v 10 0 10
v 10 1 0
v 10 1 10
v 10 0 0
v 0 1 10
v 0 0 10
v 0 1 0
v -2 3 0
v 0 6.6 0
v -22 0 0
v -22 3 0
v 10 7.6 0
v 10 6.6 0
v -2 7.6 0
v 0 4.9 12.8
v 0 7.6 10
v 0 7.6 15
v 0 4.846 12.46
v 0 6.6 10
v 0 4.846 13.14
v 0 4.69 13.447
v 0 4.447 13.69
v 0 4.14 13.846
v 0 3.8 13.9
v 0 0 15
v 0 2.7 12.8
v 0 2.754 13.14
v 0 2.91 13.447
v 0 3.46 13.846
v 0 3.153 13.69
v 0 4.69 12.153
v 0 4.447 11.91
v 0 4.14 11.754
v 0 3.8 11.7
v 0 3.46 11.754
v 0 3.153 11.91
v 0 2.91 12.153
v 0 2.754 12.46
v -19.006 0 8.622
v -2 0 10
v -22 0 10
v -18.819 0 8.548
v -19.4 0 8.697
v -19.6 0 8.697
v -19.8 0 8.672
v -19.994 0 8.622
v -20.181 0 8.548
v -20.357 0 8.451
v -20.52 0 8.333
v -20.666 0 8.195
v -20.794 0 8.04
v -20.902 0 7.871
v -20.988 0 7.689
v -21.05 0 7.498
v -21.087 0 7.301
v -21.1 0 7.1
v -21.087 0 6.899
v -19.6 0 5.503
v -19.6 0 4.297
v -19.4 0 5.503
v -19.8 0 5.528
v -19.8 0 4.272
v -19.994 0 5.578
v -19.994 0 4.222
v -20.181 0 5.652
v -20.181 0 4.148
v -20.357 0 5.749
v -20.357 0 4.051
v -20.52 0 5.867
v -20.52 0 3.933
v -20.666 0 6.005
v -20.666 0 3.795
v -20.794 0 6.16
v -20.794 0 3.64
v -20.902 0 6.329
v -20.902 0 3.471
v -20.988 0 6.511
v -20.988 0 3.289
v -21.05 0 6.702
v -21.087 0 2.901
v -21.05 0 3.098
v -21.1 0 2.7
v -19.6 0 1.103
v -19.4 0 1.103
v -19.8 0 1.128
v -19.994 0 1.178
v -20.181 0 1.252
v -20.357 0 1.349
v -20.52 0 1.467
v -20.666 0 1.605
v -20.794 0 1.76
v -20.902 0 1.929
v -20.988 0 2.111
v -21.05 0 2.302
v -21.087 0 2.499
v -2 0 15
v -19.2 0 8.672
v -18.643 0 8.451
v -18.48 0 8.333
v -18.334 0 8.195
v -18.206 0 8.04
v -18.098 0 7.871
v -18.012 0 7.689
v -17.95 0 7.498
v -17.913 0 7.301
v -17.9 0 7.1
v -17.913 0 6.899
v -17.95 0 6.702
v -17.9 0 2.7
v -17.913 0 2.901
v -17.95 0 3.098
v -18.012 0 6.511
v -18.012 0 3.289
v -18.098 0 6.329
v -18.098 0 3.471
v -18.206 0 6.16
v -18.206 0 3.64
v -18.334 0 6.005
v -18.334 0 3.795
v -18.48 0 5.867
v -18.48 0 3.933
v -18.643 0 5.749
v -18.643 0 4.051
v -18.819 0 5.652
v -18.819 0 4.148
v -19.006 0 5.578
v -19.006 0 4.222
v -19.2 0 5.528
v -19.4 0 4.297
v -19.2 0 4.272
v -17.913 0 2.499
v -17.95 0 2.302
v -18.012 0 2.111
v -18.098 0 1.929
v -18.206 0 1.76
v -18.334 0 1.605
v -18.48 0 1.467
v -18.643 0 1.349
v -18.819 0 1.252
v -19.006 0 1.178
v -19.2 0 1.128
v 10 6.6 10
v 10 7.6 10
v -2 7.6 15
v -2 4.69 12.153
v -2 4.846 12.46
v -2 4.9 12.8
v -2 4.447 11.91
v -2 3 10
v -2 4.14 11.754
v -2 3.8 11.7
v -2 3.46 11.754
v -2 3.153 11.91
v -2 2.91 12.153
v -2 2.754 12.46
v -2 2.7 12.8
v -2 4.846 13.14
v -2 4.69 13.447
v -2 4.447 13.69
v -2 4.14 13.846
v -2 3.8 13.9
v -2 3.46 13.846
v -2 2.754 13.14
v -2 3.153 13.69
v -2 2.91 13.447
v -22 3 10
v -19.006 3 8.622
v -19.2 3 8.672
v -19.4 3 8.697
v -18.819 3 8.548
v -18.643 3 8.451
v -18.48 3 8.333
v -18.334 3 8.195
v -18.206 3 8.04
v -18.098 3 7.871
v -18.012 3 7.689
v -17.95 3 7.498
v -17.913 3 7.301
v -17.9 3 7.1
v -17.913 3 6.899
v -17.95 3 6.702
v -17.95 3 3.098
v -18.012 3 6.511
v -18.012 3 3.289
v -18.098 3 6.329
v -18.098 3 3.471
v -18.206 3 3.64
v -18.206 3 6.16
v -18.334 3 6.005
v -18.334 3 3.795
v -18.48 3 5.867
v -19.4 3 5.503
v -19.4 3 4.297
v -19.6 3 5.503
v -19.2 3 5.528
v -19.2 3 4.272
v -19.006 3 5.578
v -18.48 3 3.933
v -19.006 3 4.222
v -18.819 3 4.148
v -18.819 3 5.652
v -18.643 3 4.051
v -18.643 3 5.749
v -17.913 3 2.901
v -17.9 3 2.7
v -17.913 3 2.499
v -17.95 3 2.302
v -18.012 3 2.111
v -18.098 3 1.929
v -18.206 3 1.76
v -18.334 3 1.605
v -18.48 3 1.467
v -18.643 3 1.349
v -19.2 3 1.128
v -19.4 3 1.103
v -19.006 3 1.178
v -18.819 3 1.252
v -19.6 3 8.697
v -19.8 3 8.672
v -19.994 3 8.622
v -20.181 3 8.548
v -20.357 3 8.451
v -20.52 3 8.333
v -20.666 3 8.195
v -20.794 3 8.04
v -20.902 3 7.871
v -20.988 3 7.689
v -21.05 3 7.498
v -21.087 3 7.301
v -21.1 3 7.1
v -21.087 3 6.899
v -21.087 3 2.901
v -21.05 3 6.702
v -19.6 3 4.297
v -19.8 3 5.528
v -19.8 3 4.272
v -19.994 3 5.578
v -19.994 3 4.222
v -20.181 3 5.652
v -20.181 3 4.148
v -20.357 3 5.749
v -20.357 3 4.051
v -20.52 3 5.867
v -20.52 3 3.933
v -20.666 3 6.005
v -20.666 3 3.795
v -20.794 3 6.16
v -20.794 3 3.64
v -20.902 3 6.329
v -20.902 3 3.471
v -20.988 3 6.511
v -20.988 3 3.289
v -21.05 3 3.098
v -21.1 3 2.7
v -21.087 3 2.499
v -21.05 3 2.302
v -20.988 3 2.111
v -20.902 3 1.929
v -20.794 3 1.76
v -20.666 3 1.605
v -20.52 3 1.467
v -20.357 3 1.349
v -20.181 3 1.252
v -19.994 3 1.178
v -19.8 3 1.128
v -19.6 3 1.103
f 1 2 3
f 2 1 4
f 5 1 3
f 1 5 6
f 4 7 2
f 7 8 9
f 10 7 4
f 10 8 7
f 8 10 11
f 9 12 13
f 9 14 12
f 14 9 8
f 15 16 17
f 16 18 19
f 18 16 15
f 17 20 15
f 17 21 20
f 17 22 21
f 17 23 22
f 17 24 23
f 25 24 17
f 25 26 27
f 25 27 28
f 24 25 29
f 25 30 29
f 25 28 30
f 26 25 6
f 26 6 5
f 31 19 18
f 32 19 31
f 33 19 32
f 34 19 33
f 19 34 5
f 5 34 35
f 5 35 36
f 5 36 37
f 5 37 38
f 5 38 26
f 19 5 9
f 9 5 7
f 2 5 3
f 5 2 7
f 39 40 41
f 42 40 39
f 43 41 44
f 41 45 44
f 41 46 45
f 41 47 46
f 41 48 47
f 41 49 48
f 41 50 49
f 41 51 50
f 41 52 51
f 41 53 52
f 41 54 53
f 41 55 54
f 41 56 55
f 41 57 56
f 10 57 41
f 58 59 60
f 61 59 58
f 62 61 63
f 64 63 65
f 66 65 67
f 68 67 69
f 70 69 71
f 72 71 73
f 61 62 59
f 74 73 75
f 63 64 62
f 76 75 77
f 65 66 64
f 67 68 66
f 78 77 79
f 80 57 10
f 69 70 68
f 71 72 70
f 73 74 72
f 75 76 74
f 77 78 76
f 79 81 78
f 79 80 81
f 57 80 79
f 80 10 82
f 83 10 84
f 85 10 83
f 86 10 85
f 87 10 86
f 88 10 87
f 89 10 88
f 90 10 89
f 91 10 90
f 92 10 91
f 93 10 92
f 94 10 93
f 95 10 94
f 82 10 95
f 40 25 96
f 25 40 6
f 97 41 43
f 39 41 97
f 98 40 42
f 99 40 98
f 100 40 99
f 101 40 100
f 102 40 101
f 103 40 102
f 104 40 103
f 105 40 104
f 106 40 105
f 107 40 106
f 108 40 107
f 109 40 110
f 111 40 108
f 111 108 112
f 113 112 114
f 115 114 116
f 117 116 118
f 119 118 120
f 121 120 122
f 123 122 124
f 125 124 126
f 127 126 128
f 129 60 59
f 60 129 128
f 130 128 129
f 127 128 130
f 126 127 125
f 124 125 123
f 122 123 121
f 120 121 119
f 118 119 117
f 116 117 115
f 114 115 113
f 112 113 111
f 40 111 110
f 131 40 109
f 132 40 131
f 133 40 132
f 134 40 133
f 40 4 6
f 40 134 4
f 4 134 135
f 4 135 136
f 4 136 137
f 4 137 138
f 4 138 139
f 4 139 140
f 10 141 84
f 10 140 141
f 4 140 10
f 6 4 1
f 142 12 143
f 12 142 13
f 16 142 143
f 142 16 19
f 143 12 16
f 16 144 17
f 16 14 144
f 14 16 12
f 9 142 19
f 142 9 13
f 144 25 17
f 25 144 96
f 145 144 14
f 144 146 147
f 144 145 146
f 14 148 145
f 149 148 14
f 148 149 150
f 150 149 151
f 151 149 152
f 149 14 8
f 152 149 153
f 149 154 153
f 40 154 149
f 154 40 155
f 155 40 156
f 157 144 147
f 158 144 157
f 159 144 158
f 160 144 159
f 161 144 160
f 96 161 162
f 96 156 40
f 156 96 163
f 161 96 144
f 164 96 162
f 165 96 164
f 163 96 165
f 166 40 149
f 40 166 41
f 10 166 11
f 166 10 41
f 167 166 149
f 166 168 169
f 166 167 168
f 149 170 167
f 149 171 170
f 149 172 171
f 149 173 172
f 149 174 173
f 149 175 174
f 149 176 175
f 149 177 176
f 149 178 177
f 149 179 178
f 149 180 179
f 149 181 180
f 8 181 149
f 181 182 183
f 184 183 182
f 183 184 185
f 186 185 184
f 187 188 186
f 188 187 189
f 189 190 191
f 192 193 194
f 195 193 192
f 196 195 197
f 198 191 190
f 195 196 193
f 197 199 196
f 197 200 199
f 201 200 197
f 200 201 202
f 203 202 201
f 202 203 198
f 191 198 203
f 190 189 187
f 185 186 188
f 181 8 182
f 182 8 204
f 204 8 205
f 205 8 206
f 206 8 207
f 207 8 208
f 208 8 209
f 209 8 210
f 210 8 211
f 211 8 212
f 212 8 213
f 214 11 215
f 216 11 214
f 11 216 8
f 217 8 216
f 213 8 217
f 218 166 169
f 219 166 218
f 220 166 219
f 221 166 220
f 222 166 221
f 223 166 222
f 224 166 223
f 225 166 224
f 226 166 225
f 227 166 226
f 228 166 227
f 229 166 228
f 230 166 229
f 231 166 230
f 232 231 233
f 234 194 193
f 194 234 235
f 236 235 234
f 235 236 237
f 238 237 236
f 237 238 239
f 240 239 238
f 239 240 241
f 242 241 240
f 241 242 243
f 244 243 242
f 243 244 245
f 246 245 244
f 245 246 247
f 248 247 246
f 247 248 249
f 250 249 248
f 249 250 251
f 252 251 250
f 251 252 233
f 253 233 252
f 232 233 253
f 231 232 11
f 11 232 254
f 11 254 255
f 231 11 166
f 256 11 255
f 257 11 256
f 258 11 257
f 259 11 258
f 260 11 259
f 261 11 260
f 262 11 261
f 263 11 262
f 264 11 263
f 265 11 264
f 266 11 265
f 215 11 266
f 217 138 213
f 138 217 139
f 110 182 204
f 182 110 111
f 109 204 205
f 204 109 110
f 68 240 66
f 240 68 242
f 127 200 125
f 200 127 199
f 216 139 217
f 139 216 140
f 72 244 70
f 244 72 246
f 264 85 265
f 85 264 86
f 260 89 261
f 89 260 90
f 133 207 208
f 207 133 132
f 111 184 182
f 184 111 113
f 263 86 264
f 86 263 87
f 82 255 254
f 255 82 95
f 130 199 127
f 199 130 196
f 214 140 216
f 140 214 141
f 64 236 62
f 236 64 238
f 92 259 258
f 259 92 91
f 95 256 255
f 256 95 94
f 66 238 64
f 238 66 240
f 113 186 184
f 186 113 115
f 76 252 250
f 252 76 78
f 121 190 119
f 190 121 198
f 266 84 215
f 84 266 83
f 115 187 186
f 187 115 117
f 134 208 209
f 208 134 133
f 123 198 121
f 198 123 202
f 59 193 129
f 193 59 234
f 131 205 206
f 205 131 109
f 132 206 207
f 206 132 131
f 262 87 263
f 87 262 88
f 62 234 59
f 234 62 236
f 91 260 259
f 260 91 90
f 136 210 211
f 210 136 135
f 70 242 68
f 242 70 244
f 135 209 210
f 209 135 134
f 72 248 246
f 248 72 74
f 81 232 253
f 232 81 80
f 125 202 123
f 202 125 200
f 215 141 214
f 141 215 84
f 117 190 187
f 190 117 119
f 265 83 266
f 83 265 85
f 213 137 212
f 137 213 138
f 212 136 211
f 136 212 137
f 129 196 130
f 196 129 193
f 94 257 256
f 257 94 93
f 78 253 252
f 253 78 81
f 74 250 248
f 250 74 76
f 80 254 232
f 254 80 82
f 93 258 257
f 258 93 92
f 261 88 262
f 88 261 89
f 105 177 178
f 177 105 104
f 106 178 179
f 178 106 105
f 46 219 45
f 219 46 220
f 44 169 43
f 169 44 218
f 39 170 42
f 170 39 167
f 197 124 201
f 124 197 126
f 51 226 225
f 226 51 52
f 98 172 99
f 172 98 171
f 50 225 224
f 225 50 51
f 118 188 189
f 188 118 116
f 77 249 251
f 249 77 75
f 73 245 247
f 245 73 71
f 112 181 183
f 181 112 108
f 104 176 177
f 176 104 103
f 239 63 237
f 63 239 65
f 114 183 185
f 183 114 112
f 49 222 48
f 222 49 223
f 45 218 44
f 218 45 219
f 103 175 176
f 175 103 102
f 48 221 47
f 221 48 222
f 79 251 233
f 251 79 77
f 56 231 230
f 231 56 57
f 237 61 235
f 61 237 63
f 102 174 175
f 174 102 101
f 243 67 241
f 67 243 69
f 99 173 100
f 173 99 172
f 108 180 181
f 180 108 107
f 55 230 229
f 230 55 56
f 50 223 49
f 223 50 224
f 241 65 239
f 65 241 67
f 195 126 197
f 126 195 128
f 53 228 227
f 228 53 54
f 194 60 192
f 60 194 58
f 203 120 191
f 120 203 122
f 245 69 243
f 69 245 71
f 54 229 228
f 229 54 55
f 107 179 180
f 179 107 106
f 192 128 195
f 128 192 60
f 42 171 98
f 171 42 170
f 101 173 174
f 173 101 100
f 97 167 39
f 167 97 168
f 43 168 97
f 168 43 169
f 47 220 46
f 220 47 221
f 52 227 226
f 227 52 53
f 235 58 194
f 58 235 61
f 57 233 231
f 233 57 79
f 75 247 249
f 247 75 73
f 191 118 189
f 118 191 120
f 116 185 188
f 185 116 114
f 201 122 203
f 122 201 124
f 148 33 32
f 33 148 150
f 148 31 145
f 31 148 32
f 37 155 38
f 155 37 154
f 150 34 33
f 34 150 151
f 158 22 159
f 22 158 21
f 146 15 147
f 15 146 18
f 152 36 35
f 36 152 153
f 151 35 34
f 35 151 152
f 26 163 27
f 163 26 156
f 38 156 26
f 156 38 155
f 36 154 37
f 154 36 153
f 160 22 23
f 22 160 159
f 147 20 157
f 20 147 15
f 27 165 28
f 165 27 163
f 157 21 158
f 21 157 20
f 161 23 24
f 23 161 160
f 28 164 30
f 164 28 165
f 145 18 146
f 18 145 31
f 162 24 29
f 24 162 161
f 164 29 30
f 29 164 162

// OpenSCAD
module belt_tensioner(
        feet_height = 10,
        feet_thickness = 1,
        feet_length = 10,
        plate_height = 20,
        plate_thickness = 3,
        plate_screw_diamerer = 3.2,
        plate_screw_count = 2,
        saddle_thickness = 2,
        saddle_length = 15,
        saddle_gap = 5.6,
        saddle_screw_diameter = 2.2) {
    difference() {
        union() {
            cube([feet_height, feet_thickness, feet_length]);
            translate([0, feet_thickness + saddle_gap, 0]) {
                cube([feet_height, feet_thickness, feet_length]);
            }
            translate([-saddle_thickness, 0, 0]) {
                cube([saddle_thickness, feet_thickness * 2 + saddle_gap, saddle_length]);
            }
            translate([-saddle_thickness - plate_height, 0, 0]) {
                cube([plate_height, plate_thickness, feet_length]);
            }
        }
        // Saddle screw
        translate([-saddle_thickness - 0.1, saddle_gap / 2 + feet_thickness, saddle_length - saddle_screw_diameter]) {
            rotate([0, 90, 0]) {
                cylinder(d = saddle_screw_diameter, h = saddle_thickness + 1, $fn = 20);
            }
        }
        // Plate screws
        for (i = [0 : plate_screw_count - 1]) {
            translate([-plate_height + 0.5, plate_thickness + 0.1, saddle_screw_diameter * 2 * i + 2.7]) {
                rotate([90, 0, 0]) {
                    cylinder(d = plate_screw_diamerer, h = plate_thickness + 1, $fn = 50);
                }
            }
        }
    }
}

//mirror([0, 1, 0]) {
    belt_tensioner();
//}
